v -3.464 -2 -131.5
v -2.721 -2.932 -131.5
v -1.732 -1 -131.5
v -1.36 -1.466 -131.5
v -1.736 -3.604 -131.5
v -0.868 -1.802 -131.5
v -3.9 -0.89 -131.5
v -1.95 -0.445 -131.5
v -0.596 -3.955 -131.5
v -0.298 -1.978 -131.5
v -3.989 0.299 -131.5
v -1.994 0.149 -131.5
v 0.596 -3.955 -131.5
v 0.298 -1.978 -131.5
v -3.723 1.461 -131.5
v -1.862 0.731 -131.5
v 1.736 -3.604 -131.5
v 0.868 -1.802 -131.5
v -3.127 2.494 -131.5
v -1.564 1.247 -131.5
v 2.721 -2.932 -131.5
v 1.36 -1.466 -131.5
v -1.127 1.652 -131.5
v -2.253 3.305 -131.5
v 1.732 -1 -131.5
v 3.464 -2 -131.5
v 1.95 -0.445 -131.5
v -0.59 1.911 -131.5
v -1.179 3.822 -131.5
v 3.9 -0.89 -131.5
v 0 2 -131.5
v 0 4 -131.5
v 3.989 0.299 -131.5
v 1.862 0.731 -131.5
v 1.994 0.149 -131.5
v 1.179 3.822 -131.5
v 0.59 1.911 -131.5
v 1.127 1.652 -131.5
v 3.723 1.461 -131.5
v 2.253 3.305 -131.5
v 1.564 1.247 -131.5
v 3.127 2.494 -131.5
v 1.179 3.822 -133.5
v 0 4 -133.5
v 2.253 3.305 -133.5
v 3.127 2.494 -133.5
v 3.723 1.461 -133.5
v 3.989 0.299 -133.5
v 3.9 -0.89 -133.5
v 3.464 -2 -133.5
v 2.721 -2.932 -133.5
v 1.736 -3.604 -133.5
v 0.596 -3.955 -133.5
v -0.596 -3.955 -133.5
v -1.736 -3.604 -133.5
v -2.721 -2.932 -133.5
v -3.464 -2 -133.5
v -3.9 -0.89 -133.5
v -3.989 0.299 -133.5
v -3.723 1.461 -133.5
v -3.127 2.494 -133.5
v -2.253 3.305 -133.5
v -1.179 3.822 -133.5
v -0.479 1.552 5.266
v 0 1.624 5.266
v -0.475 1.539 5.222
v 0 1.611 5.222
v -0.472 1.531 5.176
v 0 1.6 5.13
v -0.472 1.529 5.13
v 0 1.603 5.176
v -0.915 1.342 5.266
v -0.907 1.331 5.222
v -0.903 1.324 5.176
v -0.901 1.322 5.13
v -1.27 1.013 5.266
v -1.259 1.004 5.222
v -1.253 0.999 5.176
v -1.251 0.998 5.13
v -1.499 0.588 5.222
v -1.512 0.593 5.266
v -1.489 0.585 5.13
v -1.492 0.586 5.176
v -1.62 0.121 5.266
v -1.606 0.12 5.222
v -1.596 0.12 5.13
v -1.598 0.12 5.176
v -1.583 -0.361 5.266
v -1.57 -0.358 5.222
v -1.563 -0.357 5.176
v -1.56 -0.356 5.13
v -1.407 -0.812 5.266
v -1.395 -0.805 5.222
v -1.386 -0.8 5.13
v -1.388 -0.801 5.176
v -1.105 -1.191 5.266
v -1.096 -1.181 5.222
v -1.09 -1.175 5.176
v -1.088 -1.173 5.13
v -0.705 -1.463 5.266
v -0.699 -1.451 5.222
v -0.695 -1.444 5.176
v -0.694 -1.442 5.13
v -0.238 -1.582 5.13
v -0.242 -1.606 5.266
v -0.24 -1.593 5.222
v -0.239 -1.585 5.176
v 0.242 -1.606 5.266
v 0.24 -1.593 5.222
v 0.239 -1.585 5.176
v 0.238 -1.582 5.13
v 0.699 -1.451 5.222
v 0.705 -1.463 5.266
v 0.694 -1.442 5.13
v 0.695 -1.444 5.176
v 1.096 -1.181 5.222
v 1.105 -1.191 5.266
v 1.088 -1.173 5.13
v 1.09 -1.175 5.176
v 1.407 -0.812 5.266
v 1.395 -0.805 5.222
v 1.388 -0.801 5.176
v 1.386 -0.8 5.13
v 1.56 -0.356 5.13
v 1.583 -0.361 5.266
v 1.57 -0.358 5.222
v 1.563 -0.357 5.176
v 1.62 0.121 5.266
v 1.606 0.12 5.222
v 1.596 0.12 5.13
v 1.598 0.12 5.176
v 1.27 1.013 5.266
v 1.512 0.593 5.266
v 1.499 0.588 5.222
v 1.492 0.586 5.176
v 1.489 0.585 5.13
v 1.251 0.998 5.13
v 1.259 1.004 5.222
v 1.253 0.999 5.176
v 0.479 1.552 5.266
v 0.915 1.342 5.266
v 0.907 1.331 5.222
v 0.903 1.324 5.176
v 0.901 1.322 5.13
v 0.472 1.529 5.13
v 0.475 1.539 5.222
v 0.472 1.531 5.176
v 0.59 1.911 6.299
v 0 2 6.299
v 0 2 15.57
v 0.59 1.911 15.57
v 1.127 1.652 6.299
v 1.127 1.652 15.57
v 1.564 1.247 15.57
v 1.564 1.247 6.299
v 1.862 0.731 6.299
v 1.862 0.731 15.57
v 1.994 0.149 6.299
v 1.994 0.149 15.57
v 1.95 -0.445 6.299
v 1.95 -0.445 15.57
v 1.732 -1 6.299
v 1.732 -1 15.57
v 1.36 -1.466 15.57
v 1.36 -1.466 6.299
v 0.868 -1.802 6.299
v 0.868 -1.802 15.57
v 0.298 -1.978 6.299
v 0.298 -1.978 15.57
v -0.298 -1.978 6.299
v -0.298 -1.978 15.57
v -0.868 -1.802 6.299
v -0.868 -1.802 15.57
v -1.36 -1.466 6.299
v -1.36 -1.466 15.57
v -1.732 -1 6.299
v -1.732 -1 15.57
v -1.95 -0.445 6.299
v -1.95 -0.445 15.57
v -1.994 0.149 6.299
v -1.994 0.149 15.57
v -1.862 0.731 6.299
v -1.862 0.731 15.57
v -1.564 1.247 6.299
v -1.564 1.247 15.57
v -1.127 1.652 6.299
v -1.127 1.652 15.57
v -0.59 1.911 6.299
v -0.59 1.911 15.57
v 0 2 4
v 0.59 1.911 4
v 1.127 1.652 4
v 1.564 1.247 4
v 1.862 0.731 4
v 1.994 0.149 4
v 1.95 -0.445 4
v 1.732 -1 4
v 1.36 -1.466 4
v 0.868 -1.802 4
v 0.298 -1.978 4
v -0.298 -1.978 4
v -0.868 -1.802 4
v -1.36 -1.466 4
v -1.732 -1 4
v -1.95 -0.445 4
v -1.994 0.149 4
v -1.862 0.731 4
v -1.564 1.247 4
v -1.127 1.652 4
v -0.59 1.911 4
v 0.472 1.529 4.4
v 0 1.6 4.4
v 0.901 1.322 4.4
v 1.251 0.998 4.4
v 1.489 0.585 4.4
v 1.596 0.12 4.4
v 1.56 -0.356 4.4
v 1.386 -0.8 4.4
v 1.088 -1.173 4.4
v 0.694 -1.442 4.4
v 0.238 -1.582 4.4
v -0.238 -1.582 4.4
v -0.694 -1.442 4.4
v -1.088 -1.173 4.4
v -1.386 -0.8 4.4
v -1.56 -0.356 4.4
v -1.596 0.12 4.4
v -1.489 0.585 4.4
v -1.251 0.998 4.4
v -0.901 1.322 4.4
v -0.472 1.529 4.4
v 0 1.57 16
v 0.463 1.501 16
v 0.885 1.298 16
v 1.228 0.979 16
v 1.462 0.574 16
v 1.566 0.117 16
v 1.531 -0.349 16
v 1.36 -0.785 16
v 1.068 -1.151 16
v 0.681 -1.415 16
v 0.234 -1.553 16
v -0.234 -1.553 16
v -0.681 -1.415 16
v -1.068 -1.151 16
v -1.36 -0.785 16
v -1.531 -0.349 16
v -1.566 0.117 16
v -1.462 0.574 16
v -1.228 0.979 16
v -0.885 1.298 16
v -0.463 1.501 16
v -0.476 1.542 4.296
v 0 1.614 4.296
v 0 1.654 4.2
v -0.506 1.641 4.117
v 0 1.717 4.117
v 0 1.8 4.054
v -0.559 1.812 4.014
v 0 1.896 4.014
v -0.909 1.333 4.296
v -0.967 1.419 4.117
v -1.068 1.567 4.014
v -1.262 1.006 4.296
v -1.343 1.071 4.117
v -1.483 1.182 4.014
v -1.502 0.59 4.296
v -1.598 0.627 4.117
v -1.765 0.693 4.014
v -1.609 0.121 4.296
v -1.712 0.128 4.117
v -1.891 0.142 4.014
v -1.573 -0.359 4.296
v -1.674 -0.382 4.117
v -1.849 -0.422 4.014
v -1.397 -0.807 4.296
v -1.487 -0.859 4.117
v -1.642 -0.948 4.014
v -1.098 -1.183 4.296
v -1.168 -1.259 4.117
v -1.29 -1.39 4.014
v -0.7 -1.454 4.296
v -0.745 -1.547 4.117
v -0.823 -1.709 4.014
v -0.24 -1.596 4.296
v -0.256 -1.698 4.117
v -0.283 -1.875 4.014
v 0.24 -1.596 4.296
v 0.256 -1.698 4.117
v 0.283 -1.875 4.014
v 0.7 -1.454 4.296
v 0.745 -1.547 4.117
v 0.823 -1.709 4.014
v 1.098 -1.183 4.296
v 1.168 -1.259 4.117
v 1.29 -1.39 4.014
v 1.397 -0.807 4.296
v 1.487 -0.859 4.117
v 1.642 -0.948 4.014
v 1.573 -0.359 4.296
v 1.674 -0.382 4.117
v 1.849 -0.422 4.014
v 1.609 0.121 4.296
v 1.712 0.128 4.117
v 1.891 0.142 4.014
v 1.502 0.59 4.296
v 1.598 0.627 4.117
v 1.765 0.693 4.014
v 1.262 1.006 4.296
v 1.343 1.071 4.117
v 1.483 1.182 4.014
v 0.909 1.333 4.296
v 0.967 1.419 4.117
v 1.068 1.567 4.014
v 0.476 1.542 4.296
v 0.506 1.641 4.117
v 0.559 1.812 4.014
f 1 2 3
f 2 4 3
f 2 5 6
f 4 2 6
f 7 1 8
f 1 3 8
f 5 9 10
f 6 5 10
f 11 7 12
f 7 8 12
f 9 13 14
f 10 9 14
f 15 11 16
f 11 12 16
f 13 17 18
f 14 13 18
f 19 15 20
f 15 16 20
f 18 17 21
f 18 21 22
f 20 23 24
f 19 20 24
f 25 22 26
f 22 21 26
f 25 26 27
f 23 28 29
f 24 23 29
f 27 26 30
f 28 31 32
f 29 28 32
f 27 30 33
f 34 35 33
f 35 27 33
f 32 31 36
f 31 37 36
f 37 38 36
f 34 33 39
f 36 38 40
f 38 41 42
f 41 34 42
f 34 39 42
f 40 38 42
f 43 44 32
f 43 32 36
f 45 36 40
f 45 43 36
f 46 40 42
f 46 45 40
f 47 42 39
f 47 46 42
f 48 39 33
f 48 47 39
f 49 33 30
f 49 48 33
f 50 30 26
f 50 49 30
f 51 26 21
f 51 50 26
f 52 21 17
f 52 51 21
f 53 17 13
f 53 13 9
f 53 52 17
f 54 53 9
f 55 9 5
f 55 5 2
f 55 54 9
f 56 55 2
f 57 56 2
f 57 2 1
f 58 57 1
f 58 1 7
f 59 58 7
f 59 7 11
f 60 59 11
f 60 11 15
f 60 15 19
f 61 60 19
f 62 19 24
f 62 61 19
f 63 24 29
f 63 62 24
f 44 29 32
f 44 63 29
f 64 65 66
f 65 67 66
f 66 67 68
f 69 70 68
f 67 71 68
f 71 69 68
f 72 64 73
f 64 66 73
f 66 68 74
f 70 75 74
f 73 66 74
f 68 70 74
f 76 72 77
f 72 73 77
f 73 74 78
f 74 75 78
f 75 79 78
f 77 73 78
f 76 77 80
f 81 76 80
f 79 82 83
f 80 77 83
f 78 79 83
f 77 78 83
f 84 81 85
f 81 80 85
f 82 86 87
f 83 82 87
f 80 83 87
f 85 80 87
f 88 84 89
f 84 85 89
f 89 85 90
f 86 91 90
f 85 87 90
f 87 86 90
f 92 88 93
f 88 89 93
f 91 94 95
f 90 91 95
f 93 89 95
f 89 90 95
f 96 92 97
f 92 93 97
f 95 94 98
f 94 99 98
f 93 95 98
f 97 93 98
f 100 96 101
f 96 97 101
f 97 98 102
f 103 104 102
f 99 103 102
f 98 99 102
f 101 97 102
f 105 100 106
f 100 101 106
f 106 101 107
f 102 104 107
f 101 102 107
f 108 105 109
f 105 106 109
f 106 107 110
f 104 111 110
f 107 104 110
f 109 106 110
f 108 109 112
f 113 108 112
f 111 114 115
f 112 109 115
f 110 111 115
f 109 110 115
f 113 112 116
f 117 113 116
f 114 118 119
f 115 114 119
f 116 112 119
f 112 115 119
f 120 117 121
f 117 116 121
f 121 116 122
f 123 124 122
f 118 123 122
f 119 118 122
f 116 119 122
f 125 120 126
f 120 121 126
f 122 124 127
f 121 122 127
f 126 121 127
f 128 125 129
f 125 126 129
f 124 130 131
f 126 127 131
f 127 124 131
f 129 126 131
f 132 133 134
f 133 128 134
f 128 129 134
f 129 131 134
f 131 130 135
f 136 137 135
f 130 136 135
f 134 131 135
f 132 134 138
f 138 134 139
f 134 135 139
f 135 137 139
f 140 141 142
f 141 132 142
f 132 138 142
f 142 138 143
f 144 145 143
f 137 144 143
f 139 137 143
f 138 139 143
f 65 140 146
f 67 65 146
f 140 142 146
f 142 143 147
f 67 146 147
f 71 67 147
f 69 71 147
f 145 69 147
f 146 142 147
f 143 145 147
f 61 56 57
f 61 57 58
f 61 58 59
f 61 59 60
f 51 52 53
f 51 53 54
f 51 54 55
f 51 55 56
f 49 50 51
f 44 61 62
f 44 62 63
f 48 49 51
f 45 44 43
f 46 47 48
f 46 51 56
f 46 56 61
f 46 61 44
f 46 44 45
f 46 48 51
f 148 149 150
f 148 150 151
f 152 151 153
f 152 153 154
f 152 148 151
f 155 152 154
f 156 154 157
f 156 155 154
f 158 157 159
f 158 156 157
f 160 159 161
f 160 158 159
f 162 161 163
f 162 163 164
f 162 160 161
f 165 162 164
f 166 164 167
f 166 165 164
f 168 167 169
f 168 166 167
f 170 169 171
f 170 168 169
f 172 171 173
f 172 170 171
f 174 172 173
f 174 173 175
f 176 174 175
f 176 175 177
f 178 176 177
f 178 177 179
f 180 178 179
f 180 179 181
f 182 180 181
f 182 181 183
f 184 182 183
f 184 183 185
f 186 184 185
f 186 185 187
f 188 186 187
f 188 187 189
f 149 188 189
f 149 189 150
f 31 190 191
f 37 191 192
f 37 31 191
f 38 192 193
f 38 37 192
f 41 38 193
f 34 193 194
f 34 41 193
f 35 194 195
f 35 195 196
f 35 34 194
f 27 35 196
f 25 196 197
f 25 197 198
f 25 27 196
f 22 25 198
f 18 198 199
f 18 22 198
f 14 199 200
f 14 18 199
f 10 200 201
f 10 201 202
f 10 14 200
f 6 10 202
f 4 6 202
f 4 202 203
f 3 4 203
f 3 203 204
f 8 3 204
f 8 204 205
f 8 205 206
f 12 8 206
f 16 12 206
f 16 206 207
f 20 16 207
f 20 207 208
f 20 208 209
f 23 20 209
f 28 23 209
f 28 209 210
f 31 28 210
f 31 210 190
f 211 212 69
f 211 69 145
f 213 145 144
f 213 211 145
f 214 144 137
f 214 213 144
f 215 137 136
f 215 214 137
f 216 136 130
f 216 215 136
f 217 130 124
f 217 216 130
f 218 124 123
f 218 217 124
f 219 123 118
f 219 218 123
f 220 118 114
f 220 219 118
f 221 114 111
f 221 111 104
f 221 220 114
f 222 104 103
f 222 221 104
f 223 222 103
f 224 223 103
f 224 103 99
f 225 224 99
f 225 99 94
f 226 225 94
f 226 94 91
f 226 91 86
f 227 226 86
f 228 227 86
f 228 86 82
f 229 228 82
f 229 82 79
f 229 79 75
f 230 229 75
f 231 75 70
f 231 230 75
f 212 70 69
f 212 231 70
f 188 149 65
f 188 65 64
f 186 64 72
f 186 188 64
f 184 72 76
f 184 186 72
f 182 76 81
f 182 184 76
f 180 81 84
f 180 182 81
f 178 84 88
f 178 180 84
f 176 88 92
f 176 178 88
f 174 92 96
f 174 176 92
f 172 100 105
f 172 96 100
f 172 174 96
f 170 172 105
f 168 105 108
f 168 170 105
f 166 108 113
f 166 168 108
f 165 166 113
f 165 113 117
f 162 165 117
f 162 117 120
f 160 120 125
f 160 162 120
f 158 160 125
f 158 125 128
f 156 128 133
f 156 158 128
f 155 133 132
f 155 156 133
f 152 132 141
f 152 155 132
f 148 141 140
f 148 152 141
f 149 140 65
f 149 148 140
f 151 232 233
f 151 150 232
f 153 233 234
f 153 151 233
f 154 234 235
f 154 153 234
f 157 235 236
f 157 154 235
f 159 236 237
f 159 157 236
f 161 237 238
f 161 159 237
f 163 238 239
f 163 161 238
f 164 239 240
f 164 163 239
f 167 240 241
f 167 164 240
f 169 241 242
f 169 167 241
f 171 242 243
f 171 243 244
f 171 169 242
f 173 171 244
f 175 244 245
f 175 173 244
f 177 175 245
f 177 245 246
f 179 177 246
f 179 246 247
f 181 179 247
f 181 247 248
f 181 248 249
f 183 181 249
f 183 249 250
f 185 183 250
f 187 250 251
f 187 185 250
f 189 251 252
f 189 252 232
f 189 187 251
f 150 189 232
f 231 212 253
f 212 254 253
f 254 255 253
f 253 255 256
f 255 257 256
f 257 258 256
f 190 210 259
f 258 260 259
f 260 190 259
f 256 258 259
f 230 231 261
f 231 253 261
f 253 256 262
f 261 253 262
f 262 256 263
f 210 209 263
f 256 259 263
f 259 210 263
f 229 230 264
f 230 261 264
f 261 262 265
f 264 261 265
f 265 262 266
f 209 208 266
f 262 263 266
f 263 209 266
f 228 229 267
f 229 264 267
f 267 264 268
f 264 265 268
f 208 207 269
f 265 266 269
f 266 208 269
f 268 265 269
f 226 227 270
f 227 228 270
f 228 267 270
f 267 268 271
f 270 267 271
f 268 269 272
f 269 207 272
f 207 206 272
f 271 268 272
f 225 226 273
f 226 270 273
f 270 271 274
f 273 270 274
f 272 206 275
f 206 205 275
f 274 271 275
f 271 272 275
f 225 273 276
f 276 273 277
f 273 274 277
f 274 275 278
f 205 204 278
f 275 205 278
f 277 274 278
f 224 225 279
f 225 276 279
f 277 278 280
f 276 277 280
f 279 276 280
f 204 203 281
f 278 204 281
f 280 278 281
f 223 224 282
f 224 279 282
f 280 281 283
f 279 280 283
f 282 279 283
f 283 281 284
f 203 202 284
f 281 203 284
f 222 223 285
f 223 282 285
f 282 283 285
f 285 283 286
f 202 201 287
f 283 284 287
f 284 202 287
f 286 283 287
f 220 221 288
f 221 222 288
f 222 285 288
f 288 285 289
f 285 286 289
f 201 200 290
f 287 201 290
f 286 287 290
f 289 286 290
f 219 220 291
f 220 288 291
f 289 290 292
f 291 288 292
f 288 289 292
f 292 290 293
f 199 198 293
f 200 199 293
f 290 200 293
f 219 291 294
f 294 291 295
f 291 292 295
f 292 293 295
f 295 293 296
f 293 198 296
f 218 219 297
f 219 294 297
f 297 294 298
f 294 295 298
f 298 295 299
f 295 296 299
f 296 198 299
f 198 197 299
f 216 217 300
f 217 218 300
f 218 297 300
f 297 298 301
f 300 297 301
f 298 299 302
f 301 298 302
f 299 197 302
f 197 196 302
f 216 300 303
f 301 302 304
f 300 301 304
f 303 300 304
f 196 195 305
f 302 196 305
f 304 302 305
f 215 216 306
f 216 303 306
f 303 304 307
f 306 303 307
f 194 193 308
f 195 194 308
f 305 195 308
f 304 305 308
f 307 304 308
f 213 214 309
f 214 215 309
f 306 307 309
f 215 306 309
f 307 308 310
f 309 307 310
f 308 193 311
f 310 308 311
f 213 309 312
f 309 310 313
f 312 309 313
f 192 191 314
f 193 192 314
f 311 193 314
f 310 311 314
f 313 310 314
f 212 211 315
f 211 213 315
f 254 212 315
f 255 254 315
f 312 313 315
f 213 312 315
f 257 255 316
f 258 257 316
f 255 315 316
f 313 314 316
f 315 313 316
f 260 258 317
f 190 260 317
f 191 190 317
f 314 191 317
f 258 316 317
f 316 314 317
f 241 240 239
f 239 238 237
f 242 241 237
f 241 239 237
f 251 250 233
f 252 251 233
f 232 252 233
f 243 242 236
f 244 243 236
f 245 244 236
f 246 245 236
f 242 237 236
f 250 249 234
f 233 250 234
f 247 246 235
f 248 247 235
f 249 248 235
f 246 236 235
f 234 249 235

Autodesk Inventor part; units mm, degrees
sketch "Sketch_2" plane through (0, 0, 0) normal (1, 0, 0) x (0, 1, 0)
  line L0 (0, -133.5) -> (0, 4)
  line L1 (0, 4) -> (2, 4)
  line L2 (2, 4) -> (2, -131.5)
  line L3 (2, -131.5) -> (4, -131.5)
  line L4 (4, -131.5) -> (4, -133.5)
  line L5 (4, -133.5) -> (0, -133.5)
  line L6 (0, -133.5) -> (0, 4)
revolve "Revolution1" add sketch "Sketch_2" angle 360 about axis through (0, 0, -133.5) along (0, 0, -1)
sketch "Sketch_6" plane through (0, 0, 0) normal (1, 0, 0) x (0, 1, 0)
  line L0 (0, 3) -> (0, 16)
  line L1 (0, 16) -> (1.5705, 16)
  line L2 (1.5705, 16) -> (2, 15.5705)
  line L3 (2, 15.5705) -> (2, 6.299)
  line L4 (2, 6.299) -> (1.6241, 5.2663)
  arc A0 (1.6241, 5.2663) -> (1.6, 5.1295) centre (2, 5.1295) ccw
  line L5 (1.6, 5.1295) -> (1.6, 4.4)
  arc A1 (1.6, 4.4) -> (2, 4) centre (2, 4.4) ccw
  line L6 (2, 4) -> (2, 3)
  line L7 (2, 3) -> (0, 3)
  line L8 (0, 3) -> (0, 16)
revolve "Revolution2" add sketch "Sketch_6" angle 360 about axis through (0, 0, 3) along (0, 0, -1)
thread "Thread1" size "M4x0.7" class "6g" standard "ISO Metric profile" full length
ref_plane "FDT_KSAUFSATZ_XY" through (0, 0, 8.2) normal (0, 0, 1) x (-1, 0, 0)
ref_plane "FDT_KSAUFSATZ_YZ" through (0, 0, 8.2) normal (-1, 0, 0) x (0, -1, 0)
ref_plane "FDT_KSAUFSATZ_ZX" through (0, 0, 8.2) normal (0, -1, 0) x (0, 0, 1)
ref_plane "FDT_NUT_XY" through (0, 0, 8.2) normal (0, 0, 1) x (-1, 0, 0)
ref_plane "FDT_NUT_YZ" through (0, 0, 8.2) normal (-1, 0, 0) x (0, -1, 0)
ref_plane "FDT_NUT_ZX" through (0, 0, 8.2) normal (0, -1, 0) x (0, 0, 1)
ref_plane "KS_XY" through (0, 0, 0) normal (0, 0, -1) x (1, 0, 0)
ref_plane "KS_YZ" through (0, 0, 0) normal (1, 0, 0) x (0, -1, 0)
ref_plane "KS_ZX" through (0, 0, 0) normal (0, -1, 0) x (0, 0, -1)
ref_plane "NUT1_XY" through (0, 0, 12) normal (0, 0, 1) x (1, 0, 0)
ref_plane "NUT1_YZ" through (0, 0, 12) normal (1, 0, 0) x (0, 1, 0)
ref_plane "NUT1_ZX" through (0, 0, 12) normal (0, 1, 0) x (0, 0, 1)
properties part number "19182 DSNU-8-100-P---(A---00--0-KS)"
